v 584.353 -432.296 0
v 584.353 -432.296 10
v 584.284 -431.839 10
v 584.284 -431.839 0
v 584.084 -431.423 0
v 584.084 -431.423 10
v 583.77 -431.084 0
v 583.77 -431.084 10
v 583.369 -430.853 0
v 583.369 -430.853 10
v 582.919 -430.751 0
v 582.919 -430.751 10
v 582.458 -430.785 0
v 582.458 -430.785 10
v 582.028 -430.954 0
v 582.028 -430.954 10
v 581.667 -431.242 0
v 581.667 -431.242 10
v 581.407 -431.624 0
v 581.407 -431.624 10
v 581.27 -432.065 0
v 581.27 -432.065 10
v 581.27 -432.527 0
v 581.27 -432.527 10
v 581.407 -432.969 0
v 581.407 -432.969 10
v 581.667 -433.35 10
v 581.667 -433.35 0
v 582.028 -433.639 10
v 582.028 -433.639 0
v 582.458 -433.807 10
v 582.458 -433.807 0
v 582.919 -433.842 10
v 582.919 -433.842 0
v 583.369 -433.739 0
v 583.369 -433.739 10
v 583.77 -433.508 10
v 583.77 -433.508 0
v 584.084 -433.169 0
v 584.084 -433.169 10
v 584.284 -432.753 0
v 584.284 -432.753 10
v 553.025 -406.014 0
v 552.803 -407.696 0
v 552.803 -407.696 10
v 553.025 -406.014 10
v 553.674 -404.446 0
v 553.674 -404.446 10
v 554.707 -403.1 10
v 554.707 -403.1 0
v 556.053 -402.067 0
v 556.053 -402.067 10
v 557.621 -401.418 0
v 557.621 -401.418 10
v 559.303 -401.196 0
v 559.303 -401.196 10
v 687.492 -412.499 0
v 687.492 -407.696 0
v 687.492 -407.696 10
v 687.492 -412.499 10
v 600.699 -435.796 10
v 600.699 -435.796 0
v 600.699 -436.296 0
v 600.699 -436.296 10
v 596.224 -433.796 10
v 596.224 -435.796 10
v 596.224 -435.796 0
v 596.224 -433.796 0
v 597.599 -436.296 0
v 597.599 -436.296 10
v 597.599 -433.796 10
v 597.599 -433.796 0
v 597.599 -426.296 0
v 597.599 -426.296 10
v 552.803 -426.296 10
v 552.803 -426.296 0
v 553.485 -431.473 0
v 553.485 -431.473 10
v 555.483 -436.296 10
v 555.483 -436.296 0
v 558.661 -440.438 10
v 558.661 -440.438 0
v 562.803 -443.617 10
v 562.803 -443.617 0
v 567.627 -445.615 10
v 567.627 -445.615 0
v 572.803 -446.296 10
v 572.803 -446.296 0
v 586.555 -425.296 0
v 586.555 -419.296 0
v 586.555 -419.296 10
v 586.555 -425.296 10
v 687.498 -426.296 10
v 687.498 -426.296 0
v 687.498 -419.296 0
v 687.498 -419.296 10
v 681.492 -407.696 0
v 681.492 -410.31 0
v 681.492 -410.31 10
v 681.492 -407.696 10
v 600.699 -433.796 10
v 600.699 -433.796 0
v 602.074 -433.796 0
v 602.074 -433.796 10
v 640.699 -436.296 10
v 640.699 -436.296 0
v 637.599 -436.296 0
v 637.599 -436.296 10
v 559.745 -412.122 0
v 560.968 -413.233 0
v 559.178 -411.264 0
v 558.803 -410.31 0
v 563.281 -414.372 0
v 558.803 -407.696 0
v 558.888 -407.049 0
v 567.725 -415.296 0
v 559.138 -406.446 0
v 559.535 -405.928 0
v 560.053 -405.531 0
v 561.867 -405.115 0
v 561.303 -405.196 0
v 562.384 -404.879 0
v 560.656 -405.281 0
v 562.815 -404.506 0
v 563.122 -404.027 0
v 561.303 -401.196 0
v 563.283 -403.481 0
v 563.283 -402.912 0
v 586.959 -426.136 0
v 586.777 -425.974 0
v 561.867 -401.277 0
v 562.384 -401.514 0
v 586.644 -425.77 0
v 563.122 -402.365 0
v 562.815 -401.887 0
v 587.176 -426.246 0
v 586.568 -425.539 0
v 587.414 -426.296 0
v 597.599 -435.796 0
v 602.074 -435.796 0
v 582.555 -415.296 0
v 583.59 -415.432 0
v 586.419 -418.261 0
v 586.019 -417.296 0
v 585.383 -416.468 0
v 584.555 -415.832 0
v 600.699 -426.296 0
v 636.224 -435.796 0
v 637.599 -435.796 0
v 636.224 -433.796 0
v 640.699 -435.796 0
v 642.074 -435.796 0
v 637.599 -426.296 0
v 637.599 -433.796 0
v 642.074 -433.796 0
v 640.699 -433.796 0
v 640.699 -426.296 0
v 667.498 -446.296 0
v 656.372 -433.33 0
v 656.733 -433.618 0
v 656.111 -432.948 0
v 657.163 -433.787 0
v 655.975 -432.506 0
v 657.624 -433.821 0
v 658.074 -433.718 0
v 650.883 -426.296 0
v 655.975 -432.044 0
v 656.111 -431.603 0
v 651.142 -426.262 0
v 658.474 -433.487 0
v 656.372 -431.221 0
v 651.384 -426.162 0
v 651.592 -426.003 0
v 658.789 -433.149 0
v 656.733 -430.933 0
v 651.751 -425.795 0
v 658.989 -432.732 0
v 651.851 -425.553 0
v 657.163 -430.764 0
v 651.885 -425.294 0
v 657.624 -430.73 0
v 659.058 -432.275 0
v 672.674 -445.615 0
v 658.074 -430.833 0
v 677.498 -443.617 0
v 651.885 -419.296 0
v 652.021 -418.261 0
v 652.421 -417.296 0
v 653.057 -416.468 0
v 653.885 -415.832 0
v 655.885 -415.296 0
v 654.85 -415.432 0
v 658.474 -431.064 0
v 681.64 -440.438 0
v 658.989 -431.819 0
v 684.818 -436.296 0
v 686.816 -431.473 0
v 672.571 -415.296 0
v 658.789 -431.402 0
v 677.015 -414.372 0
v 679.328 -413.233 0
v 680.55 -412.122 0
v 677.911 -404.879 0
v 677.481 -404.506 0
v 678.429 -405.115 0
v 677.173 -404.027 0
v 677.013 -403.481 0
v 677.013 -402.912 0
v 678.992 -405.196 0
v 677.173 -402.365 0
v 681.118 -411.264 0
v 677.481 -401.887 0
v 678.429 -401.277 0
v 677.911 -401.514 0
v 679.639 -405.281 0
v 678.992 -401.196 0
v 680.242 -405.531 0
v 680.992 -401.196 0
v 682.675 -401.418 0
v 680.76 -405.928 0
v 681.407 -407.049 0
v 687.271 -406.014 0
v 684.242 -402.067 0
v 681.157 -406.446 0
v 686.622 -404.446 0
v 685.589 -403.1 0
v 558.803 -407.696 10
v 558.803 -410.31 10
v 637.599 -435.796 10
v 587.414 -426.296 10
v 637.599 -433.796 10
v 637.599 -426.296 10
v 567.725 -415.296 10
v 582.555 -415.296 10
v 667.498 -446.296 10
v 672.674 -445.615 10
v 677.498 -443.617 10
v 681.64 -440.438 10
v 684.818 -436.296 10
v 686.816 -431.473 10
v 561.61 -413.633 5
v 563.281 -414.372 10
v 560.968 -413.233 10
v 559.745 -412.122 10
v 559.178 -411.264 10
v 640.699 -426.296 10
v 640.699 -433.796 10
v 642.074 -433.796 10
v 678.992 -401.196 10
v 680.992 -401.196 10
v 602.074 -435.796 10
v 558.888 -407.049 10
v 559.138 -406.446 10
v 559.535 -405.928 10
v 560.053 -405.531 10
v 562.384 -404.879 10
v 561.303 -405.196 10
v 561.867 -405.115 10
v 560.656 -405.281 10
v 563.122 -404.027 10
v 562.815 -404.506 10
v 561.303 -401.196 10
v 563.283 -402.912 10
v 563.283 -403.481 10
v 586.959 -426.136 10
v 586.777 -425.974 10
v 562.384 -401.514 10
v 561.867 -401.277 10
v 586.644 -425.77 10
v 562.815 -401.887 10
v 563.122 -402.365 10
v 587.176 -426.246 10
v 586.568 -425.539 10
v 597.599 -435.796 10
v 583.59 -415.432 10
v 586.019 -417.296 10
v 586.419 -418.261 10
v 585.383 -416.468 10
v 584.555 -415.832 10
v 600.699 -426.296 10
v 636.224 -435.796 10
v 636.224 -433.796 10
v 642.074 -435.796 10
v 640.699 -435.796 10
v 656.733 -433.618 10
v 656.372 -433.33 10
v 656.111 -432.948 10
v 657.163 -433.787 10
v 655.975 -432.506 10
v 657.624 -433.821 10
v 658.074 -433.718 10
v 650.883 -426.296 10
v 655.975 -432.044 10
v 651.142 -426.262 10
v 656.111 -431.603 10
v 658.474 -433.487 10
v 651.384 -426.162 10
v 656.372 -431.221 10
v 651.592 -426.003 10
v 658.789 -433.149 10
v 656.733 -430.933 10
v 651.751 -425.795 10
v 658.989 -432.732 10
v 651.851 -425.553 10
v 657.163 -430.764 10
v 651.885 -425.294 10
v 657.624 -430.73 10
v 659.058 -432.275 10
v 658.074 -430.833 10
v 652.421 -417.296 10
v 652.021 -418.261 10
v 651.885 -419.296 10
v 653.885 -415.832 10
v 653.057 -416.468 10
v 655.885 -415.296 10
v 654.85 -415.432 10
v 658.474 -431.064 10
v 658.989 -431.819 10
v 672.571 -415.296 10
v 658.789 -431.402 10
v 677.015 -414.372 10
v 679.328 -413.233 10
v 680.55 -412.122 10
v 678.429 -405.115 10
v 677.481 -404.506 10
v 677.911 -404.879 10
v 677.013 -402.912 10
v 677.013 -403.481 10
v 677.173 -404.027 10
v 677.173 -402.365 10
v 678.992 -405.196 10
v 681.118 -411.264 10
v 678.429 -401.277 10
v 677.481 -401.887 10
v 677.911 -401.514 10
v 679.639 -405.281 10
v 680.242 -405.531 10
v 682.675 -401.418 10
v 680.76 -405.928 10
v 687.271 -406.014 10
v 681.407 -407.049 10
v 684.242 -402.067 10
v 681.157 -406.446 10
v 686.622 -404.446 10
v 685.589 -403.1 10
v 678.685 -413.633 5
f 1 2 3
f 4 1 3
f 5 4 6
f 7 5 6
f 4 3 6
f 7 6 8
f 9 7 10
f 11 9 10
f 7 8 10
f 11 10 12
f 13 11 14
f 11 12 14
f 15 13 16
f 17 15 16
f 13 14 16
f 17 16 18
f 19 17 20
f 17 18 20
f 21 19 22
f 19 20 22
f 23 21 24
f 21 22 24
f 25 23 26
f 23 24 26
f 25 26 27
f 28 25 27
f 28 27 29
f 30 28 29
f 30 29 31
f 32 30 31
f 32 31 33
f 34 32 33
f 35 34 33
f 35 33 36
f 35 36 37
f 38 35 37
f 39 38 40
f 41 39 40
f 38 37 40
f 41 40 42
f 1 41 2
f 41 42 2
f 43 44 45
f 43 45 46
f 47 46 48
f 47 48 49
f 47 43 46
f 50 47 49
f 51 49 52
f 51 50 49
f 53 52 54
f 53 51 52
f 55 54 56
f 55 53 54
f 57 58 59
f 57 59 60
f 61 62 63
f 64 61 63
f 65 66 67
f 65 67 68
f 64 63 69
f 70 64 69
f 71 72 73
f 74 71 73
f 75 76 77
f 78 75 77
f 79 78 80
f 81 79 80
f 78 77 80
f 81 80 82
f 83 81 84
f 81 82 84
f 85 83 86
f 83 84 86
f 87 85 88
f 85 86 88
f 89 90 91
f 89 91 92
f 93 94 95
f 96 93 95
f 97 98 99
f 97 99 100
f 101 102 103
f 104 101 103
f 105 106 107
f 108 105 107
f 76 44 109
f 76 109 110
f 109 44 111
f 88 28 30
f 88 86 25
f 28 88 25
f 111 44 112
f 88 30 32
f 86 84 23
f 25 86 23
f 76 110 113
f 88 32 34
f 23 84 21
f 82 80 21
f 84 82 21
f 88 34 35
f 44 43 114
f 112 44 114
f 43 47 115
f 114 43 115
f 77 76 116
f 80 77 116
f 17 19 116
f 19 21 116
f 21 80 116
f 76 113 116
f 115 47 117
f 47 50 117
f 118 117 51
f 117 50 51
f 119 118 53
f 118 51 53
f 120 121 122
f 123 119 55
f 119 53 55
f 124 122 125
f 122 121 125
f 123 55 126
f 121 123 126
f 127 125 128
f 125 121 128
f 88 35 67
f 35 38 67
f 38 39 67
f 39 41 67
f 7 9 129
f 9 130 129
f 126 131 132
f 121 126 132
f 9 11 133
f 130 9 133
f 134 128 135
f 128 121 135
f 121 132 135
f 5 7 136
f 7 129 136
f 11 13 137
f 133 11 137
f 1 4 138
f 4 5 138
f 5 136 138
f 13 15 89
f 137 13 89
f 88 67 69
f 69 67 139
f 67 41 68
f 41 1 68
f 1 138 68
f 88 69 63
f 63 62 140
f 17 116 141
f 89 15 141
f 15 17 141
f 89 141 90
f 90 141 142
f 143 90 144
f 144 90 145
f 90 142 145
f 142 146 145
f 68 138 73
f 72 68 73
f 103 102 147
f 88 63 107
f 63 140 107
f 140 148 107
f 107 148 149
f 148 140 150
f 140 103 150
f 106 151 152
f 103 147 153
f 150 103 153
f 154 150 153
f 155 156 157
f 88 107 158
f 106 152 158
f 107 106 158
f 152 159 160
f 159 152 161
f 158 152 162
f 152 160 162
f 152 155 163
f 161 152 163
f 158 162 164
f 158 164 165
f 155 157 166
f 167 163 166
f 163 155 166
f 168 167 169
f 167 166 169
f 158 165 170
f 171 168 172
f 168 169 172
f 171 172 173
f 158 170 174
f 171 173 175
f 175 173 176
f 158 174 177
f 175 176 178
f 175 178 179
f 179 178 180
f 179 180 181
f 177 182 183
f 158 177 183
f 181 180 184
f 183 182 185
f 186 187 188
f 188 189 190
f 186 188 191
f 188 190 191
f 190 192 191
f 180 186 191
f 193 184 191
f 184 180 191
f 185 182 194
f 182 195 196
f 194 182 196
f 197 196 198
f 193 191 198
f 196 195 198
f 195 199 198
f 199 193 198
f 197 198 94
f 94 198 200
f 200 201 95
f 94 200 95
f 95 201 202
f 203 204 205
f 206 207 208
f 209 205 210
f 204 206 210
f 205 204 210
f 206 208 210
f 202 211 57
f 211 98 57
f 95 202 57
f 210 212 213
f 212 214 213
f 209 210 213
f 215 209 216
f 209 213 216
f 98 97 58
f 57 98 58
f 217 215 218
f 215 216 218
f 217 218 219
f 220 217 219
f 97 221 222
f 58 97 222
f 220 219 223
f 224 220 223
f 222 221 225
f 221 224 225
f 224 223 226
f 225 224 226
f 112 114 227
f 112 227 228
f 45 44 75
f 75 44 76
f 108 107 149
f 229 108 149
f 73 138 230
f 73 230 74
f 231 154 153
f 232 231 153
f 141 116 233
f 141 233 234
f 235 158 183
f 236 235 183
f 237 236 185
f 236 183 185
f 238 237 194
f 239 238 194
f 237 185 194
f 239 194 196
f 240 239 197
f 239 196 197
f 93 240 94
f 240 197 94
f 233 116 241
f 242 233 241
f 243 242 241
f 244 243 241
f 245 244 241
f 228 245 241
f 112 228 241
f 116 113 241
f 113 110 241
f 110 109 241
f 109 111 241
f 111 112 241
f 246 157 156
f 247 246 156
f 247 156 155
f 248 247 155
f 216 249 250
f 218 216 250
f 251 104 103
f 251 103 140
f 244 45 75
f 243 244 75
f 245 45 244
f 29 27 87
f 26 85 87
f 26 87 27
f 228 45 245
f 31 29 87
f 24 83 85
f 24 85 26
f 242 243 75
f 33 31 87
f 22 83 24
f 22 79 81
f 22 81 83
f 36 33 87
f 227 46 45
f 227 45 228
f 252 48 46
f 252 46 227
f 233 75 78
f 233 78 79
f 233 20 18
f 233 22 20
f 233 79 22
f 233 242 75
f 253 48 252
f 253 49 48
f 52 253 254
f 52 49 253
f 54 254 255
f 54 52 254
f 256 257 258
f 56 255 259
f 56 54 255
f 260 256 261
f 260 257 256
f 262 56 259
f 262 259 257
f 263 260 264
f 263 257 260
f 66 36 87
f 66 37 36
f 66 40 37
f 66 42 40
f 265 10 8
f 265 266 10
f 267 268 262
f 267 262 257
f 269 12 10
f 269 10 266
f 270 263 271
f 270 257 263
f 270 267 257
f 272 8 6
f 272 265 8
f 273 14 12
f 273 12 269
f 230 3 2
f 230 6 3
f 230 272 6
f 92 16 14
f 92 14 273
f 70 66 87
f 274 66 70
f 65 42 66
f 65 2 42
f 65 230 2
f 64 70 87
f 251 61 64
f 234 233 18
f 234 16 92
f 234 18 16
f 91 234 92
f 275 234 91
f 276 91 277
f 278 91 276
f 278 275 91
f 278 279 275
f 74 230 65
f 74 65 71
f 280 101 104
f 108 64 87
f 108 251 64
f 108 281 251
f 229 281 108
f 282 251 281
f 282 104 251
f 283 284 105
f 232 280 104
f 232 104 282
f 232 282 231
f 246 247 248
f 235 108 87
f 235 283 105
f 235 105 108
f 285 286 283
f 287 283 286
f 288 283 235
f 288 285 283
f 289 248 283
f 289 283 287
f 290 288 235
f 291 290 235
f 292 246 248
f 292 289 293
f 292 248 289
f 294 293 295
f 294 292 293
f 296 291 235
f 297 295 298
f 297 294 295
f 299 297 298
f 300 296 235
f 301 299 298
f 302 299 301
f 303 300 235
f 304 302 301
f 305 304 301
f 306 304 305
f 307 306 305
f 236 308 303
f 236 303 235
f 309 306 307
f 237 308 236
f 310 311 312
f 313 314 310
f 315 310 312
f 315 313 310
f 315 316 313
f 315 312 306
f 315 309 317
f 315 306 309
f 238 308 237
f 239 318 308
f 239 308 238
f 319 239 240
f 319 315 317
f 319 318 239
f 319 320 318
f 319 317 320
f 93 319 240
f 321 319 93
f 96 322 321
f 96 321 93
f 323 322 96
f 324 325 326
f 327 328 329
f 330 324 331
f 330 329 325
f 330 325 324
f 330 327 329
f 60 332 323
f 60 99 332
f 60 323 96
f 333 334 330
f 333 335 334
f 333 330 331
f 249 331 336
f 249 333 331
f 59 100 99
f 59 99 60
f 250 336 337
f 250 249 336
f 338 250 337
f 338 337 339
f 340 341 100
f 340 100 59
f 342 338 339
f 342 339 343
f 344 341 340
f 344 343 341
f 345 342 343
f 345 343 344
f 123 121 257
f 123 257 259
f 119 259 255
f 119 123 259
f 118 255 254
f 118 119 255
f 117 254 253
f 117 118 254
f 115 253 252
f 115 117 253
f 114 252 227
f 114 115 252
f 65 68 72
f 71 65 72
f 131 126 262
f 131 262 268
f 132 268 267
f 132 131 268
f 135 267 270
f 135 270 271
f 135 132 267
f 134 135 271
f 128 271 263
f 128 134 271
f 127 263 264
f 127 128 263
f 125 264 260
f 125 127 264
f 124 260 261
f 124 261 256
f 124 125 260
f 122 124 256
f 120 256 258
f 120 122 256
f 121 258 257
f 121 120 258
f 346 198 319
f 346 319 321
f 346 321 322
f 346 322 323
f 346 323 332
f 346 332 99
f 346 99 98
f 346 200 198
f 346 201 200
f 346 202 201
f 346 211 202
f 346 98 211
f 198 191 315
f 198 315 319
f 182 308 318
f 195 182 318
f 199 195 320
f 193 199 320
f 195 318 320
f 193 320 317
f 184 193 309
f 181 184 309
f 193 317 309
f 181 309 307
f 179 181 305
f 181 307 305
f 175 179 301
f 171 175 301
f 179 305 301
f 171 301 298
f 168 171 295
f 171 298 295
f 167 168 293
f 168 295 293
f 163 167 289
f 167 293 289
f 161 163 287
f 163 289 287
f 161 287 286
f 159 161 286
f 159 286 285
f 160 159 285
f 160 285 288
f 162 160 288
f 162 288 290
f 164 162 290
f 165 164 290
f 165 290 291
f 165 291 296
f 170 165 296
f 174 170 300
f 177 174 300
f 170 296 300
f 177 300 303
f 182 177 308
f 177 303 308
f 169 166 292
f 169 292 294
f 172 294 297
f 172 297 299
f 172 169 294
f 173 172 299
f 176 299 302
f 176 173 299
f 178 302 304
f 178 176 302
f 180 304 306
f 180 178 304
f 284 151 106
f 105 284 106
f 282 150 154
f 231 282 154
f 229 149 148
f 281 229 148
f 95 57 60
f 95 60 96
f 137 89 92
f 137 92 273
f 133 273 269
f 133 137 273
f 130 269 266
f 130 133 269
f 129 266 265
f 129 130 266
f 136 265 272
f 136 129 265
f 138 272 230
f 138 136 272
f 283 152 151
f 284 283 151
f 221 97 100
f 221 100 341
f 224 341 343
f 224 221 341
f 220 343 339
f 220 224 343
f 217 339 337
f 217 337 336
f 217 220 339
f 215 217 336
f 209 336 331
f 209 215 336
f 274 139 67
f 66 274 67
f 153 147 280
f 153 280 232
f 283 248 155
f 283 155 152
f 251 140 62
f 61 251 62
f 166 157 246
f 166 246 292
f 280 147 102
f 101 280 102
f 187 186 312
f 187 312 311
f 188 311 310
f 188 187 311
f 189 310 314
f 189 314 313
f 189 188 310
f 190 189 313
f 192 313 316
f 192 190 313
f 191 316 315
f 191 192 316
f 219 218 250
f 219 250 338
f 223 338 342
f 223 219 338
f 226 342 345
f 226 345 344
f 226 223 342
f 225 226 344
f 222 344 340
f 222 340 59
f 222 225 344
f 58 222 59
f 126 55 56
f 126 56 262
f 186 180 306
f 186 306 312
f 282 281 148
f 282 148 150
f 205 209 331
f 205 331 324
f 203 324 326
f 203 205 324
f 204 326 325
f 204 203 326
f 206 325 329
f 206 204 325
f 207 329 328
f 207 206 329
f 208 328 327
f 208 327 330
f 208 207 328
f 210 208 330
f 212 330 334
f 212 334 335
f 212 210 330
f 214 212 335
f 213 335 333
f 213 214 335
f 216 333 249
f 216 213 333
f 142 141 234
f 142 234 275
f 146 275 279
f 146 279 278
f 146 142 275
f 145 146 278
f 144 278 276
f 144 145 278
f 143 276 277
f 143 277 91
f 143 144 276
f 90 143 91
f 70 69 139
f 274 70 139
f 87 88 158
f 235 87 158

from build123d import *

# Parameters (mm, degrees)
DODANIE_WYCI_GNI_CIE1_DEPTH = 10
SZKIC2_R                    = 1.55
WYTNIJ_WYCI_GNI_CIE1_DEPTH  = 10
WYTNIJ_WYCI_GNI_CIE2_DEPTH  = 10
DODANIE_WYCI_GNI_CIE2_DEPTH = 10


with BuildPart() as part:
    # Szkic1 → Dodanie-wyciągnięcie1 (new body)
    with BuildSketch(Plane.XY):
        with BuildLine():
            Line((587.414080321, -426.296177349), (650.882642176, -426.296177349))
            ThreePointArc((650.882642176, -426.296177349), (651.591558731, -426.002534497), (651.885201582, -425.293617942))
            Line((651.885201582, -425.293617942), (651.885201582, -419.296173179))
            ThreePointArc((651.885201582, -419.296173179), (653.056774457, -416.467746055), (655.885201582, -415.296173179))
            Line((655.885201582, -415.296173179), (672.570535687, -415.296173179))
            add(Edge.make_bspline(
                [(672.570535687, -415.296173179), (680.339252511, -414.463378733), (681.492424358, -410.309612352)],
                knots=[0, 0, 0, 1, 1, 1], degree=2))
            Line((681.492424358, -410.309612352), (681.492424358, -407.696232794))
            ThreePointArc((681.492424358, -407.696232794), (680.760191311, -405.928465841), (678.992424358, -405.196232794))
            ThreePointArc((678.992424358, -405.196232794), (676.992424358, -403.196232794), (678.992424358, -401.196232794))
            Line((678.992424358, -401.196232794), (680.992424358, -401.196232794))
            ThreePointArc((680.992424358, -401.196232794), (685.588618435, -403.100038717), (687.492424358, -407.696232794))
            Line((687.492424358, -407.696232794), (687.492424358, -412.4992576))
            Line((687.492424358, -412.4992576), (687.497764867, -419.296173358))
            ThreePointArc((687.497764867, -419.296173358), (681.63990049, -433.438308981), (667.497764867, -439.296173358))
            Line((667.497764867, -439.296173358), (572.803105375, -439.296173358))
            ThreePointArc((572.803105375, -439.296173358), (558.660969752, -433.438308981), (552.803105375, -419.296173358))
            Line((552.803105375, -419.296173358), (552.803105375, -407.696232794))
            ThreePointArc((552.803105375, -407.696232794), (554.706911183, -403.100038993), (559.303104985, -401.196233185))
            Line((559.303104985, -401.196233185), (561.303104985, -401.196232404))
            ThreePointArc((561.303104985, -401.196232404), (563.303105554, -403.196232208), (561.303105749, -405.196232777))
            ThreePointArc((561.303105749, -405.196232777), (559.535338555, -405.928465692), (558.803105376, -407.696232777))
            Line((558.803105376, -407.696232777), (558.803105375, -410.309612352))
            add(Edge.make_bspline(
                [(567.724994046, -415.296173179), (559.956277223, -414.463378733), (558.803105375, -410.309612352)],
                knots=[0, 0, 0, 1, 1, 1], degree=2))
            Line((567.724994046, -415.296173179), (582.555068068, -415.296173179))
            ThreePointArc((582.555068068, -415.296173179), (585.383495193, -416.467746055), (586.555068068, -419.296173179))
            Line((586.555068068, -419.296173179), (586.555068068, -425.296173358))
            ThreePointArc((586.555068068, -425.296173358), (586.777466587, -425.974082616), (587.414080321, -426.296177349))
        make_face()
    extrude(amount=DODANIE_WYCI_GNI_CIE1_DEPTH)

    # Szkic2 → Wytnij-wyciągnięcie1 (cut)
    with BuildSketch(Plane.XY.offset(10)):
        with Locations((657.507953751, -432.275447831)):
            Circle(SZKIC2_R)
        with Locations((582.803105375, -432.296173587)):
            Circle(SZKIC2_R)
    extrude(amount=-WYTNIJ_WYCI_GNI_CIE1_DEPTH, mode=Mode.SUBTRACT)

    # Szkic3 → Wytnij-wyciągnięcie2 (cut)
    with BuildSketch(Plane(origin=(0, 0, 0), x_dir=(-1, 0, 0), z_dir=(0, 0, -1))):
        Polygon((-600.699082892, -426.296174265), (-600.699082892, -433.796174265), (-602.074082892, -433.796174265), (-602.074082892, -435.796174265), (-600.699082892, -435.796174265), (-600.699082892, -436.296174265), (-597.599082892, -436.296174265), (-597.599082892, -435.796174265), (-596.224082892, -435.796174265), (-596.224082892, -433.796174265), (-597.599082892, -433.796174265), (-597.599082892, -426.296174265), align=None)
        Polygon((-640.699082892, -426.296174265), (-640.699082892, -433.796174265), (-642.074082892, -433.796174265), (-642.074082892, -435.796174265), (-640.699082892, -435.796174265), (-640.699082892, -436.296174265), (-637.599082892, -436.296174265), (-637.599082892, -435.796174265), (-636.224082892, -435.796174265), (-636.224082892, -433.796174265), (-637.599082892, -433.796174265), (-637.599082892, -426.296174265), align=None)
    extrude(amount=-WYTNIJ_WYCI_GNI_CIE2_DEPTH, mode=Mode.SUBTRACT)

    # Szkic4 → Dodanie-wyciągnięcie2 (add)
    with BuildSketch(Plane(origin=(0, 0, 0), x_dir=(-1, 0, 0), z_dir=(0, 0, -1))):
        with BuildLine():
            Line((-572.80310596, -446.29617968), (-667.497765451, -446.296171767))
            ThreePointArc((-667.497765451, -446.296171767), (-681.639900798, -440.438306104), (-687.497764867, -426.296170096))
            Line((-687.497764867, -426.296170096), (-687.497764867, -419.296173358))
            ThreePointArc((-687.497764867, -419.296173358), (-681.63990049, -433.438308981), (-667.497764867, -439.296173358))
            Line((-667.497764867, -439.296173358), (-572.803105375, -439.296173358))
            ThreePointArc((-572.803105375, -439.296173358), (-558.660969752, -433.438308981), (-552.803105375, -419.296173358))
            Line((-552.803105375, -419.296173358), (-552.803105375, -426.296181351))
            ThreePointArc((-552.803105375, -426.296181351), (-558.660970549, -440.438316101), (-572.80310596, -446.29617968))
        make_face()
    extrude(amount=-DODANIE_WYCI_GNI_CIE2_DEPTH)


solid = part.part
